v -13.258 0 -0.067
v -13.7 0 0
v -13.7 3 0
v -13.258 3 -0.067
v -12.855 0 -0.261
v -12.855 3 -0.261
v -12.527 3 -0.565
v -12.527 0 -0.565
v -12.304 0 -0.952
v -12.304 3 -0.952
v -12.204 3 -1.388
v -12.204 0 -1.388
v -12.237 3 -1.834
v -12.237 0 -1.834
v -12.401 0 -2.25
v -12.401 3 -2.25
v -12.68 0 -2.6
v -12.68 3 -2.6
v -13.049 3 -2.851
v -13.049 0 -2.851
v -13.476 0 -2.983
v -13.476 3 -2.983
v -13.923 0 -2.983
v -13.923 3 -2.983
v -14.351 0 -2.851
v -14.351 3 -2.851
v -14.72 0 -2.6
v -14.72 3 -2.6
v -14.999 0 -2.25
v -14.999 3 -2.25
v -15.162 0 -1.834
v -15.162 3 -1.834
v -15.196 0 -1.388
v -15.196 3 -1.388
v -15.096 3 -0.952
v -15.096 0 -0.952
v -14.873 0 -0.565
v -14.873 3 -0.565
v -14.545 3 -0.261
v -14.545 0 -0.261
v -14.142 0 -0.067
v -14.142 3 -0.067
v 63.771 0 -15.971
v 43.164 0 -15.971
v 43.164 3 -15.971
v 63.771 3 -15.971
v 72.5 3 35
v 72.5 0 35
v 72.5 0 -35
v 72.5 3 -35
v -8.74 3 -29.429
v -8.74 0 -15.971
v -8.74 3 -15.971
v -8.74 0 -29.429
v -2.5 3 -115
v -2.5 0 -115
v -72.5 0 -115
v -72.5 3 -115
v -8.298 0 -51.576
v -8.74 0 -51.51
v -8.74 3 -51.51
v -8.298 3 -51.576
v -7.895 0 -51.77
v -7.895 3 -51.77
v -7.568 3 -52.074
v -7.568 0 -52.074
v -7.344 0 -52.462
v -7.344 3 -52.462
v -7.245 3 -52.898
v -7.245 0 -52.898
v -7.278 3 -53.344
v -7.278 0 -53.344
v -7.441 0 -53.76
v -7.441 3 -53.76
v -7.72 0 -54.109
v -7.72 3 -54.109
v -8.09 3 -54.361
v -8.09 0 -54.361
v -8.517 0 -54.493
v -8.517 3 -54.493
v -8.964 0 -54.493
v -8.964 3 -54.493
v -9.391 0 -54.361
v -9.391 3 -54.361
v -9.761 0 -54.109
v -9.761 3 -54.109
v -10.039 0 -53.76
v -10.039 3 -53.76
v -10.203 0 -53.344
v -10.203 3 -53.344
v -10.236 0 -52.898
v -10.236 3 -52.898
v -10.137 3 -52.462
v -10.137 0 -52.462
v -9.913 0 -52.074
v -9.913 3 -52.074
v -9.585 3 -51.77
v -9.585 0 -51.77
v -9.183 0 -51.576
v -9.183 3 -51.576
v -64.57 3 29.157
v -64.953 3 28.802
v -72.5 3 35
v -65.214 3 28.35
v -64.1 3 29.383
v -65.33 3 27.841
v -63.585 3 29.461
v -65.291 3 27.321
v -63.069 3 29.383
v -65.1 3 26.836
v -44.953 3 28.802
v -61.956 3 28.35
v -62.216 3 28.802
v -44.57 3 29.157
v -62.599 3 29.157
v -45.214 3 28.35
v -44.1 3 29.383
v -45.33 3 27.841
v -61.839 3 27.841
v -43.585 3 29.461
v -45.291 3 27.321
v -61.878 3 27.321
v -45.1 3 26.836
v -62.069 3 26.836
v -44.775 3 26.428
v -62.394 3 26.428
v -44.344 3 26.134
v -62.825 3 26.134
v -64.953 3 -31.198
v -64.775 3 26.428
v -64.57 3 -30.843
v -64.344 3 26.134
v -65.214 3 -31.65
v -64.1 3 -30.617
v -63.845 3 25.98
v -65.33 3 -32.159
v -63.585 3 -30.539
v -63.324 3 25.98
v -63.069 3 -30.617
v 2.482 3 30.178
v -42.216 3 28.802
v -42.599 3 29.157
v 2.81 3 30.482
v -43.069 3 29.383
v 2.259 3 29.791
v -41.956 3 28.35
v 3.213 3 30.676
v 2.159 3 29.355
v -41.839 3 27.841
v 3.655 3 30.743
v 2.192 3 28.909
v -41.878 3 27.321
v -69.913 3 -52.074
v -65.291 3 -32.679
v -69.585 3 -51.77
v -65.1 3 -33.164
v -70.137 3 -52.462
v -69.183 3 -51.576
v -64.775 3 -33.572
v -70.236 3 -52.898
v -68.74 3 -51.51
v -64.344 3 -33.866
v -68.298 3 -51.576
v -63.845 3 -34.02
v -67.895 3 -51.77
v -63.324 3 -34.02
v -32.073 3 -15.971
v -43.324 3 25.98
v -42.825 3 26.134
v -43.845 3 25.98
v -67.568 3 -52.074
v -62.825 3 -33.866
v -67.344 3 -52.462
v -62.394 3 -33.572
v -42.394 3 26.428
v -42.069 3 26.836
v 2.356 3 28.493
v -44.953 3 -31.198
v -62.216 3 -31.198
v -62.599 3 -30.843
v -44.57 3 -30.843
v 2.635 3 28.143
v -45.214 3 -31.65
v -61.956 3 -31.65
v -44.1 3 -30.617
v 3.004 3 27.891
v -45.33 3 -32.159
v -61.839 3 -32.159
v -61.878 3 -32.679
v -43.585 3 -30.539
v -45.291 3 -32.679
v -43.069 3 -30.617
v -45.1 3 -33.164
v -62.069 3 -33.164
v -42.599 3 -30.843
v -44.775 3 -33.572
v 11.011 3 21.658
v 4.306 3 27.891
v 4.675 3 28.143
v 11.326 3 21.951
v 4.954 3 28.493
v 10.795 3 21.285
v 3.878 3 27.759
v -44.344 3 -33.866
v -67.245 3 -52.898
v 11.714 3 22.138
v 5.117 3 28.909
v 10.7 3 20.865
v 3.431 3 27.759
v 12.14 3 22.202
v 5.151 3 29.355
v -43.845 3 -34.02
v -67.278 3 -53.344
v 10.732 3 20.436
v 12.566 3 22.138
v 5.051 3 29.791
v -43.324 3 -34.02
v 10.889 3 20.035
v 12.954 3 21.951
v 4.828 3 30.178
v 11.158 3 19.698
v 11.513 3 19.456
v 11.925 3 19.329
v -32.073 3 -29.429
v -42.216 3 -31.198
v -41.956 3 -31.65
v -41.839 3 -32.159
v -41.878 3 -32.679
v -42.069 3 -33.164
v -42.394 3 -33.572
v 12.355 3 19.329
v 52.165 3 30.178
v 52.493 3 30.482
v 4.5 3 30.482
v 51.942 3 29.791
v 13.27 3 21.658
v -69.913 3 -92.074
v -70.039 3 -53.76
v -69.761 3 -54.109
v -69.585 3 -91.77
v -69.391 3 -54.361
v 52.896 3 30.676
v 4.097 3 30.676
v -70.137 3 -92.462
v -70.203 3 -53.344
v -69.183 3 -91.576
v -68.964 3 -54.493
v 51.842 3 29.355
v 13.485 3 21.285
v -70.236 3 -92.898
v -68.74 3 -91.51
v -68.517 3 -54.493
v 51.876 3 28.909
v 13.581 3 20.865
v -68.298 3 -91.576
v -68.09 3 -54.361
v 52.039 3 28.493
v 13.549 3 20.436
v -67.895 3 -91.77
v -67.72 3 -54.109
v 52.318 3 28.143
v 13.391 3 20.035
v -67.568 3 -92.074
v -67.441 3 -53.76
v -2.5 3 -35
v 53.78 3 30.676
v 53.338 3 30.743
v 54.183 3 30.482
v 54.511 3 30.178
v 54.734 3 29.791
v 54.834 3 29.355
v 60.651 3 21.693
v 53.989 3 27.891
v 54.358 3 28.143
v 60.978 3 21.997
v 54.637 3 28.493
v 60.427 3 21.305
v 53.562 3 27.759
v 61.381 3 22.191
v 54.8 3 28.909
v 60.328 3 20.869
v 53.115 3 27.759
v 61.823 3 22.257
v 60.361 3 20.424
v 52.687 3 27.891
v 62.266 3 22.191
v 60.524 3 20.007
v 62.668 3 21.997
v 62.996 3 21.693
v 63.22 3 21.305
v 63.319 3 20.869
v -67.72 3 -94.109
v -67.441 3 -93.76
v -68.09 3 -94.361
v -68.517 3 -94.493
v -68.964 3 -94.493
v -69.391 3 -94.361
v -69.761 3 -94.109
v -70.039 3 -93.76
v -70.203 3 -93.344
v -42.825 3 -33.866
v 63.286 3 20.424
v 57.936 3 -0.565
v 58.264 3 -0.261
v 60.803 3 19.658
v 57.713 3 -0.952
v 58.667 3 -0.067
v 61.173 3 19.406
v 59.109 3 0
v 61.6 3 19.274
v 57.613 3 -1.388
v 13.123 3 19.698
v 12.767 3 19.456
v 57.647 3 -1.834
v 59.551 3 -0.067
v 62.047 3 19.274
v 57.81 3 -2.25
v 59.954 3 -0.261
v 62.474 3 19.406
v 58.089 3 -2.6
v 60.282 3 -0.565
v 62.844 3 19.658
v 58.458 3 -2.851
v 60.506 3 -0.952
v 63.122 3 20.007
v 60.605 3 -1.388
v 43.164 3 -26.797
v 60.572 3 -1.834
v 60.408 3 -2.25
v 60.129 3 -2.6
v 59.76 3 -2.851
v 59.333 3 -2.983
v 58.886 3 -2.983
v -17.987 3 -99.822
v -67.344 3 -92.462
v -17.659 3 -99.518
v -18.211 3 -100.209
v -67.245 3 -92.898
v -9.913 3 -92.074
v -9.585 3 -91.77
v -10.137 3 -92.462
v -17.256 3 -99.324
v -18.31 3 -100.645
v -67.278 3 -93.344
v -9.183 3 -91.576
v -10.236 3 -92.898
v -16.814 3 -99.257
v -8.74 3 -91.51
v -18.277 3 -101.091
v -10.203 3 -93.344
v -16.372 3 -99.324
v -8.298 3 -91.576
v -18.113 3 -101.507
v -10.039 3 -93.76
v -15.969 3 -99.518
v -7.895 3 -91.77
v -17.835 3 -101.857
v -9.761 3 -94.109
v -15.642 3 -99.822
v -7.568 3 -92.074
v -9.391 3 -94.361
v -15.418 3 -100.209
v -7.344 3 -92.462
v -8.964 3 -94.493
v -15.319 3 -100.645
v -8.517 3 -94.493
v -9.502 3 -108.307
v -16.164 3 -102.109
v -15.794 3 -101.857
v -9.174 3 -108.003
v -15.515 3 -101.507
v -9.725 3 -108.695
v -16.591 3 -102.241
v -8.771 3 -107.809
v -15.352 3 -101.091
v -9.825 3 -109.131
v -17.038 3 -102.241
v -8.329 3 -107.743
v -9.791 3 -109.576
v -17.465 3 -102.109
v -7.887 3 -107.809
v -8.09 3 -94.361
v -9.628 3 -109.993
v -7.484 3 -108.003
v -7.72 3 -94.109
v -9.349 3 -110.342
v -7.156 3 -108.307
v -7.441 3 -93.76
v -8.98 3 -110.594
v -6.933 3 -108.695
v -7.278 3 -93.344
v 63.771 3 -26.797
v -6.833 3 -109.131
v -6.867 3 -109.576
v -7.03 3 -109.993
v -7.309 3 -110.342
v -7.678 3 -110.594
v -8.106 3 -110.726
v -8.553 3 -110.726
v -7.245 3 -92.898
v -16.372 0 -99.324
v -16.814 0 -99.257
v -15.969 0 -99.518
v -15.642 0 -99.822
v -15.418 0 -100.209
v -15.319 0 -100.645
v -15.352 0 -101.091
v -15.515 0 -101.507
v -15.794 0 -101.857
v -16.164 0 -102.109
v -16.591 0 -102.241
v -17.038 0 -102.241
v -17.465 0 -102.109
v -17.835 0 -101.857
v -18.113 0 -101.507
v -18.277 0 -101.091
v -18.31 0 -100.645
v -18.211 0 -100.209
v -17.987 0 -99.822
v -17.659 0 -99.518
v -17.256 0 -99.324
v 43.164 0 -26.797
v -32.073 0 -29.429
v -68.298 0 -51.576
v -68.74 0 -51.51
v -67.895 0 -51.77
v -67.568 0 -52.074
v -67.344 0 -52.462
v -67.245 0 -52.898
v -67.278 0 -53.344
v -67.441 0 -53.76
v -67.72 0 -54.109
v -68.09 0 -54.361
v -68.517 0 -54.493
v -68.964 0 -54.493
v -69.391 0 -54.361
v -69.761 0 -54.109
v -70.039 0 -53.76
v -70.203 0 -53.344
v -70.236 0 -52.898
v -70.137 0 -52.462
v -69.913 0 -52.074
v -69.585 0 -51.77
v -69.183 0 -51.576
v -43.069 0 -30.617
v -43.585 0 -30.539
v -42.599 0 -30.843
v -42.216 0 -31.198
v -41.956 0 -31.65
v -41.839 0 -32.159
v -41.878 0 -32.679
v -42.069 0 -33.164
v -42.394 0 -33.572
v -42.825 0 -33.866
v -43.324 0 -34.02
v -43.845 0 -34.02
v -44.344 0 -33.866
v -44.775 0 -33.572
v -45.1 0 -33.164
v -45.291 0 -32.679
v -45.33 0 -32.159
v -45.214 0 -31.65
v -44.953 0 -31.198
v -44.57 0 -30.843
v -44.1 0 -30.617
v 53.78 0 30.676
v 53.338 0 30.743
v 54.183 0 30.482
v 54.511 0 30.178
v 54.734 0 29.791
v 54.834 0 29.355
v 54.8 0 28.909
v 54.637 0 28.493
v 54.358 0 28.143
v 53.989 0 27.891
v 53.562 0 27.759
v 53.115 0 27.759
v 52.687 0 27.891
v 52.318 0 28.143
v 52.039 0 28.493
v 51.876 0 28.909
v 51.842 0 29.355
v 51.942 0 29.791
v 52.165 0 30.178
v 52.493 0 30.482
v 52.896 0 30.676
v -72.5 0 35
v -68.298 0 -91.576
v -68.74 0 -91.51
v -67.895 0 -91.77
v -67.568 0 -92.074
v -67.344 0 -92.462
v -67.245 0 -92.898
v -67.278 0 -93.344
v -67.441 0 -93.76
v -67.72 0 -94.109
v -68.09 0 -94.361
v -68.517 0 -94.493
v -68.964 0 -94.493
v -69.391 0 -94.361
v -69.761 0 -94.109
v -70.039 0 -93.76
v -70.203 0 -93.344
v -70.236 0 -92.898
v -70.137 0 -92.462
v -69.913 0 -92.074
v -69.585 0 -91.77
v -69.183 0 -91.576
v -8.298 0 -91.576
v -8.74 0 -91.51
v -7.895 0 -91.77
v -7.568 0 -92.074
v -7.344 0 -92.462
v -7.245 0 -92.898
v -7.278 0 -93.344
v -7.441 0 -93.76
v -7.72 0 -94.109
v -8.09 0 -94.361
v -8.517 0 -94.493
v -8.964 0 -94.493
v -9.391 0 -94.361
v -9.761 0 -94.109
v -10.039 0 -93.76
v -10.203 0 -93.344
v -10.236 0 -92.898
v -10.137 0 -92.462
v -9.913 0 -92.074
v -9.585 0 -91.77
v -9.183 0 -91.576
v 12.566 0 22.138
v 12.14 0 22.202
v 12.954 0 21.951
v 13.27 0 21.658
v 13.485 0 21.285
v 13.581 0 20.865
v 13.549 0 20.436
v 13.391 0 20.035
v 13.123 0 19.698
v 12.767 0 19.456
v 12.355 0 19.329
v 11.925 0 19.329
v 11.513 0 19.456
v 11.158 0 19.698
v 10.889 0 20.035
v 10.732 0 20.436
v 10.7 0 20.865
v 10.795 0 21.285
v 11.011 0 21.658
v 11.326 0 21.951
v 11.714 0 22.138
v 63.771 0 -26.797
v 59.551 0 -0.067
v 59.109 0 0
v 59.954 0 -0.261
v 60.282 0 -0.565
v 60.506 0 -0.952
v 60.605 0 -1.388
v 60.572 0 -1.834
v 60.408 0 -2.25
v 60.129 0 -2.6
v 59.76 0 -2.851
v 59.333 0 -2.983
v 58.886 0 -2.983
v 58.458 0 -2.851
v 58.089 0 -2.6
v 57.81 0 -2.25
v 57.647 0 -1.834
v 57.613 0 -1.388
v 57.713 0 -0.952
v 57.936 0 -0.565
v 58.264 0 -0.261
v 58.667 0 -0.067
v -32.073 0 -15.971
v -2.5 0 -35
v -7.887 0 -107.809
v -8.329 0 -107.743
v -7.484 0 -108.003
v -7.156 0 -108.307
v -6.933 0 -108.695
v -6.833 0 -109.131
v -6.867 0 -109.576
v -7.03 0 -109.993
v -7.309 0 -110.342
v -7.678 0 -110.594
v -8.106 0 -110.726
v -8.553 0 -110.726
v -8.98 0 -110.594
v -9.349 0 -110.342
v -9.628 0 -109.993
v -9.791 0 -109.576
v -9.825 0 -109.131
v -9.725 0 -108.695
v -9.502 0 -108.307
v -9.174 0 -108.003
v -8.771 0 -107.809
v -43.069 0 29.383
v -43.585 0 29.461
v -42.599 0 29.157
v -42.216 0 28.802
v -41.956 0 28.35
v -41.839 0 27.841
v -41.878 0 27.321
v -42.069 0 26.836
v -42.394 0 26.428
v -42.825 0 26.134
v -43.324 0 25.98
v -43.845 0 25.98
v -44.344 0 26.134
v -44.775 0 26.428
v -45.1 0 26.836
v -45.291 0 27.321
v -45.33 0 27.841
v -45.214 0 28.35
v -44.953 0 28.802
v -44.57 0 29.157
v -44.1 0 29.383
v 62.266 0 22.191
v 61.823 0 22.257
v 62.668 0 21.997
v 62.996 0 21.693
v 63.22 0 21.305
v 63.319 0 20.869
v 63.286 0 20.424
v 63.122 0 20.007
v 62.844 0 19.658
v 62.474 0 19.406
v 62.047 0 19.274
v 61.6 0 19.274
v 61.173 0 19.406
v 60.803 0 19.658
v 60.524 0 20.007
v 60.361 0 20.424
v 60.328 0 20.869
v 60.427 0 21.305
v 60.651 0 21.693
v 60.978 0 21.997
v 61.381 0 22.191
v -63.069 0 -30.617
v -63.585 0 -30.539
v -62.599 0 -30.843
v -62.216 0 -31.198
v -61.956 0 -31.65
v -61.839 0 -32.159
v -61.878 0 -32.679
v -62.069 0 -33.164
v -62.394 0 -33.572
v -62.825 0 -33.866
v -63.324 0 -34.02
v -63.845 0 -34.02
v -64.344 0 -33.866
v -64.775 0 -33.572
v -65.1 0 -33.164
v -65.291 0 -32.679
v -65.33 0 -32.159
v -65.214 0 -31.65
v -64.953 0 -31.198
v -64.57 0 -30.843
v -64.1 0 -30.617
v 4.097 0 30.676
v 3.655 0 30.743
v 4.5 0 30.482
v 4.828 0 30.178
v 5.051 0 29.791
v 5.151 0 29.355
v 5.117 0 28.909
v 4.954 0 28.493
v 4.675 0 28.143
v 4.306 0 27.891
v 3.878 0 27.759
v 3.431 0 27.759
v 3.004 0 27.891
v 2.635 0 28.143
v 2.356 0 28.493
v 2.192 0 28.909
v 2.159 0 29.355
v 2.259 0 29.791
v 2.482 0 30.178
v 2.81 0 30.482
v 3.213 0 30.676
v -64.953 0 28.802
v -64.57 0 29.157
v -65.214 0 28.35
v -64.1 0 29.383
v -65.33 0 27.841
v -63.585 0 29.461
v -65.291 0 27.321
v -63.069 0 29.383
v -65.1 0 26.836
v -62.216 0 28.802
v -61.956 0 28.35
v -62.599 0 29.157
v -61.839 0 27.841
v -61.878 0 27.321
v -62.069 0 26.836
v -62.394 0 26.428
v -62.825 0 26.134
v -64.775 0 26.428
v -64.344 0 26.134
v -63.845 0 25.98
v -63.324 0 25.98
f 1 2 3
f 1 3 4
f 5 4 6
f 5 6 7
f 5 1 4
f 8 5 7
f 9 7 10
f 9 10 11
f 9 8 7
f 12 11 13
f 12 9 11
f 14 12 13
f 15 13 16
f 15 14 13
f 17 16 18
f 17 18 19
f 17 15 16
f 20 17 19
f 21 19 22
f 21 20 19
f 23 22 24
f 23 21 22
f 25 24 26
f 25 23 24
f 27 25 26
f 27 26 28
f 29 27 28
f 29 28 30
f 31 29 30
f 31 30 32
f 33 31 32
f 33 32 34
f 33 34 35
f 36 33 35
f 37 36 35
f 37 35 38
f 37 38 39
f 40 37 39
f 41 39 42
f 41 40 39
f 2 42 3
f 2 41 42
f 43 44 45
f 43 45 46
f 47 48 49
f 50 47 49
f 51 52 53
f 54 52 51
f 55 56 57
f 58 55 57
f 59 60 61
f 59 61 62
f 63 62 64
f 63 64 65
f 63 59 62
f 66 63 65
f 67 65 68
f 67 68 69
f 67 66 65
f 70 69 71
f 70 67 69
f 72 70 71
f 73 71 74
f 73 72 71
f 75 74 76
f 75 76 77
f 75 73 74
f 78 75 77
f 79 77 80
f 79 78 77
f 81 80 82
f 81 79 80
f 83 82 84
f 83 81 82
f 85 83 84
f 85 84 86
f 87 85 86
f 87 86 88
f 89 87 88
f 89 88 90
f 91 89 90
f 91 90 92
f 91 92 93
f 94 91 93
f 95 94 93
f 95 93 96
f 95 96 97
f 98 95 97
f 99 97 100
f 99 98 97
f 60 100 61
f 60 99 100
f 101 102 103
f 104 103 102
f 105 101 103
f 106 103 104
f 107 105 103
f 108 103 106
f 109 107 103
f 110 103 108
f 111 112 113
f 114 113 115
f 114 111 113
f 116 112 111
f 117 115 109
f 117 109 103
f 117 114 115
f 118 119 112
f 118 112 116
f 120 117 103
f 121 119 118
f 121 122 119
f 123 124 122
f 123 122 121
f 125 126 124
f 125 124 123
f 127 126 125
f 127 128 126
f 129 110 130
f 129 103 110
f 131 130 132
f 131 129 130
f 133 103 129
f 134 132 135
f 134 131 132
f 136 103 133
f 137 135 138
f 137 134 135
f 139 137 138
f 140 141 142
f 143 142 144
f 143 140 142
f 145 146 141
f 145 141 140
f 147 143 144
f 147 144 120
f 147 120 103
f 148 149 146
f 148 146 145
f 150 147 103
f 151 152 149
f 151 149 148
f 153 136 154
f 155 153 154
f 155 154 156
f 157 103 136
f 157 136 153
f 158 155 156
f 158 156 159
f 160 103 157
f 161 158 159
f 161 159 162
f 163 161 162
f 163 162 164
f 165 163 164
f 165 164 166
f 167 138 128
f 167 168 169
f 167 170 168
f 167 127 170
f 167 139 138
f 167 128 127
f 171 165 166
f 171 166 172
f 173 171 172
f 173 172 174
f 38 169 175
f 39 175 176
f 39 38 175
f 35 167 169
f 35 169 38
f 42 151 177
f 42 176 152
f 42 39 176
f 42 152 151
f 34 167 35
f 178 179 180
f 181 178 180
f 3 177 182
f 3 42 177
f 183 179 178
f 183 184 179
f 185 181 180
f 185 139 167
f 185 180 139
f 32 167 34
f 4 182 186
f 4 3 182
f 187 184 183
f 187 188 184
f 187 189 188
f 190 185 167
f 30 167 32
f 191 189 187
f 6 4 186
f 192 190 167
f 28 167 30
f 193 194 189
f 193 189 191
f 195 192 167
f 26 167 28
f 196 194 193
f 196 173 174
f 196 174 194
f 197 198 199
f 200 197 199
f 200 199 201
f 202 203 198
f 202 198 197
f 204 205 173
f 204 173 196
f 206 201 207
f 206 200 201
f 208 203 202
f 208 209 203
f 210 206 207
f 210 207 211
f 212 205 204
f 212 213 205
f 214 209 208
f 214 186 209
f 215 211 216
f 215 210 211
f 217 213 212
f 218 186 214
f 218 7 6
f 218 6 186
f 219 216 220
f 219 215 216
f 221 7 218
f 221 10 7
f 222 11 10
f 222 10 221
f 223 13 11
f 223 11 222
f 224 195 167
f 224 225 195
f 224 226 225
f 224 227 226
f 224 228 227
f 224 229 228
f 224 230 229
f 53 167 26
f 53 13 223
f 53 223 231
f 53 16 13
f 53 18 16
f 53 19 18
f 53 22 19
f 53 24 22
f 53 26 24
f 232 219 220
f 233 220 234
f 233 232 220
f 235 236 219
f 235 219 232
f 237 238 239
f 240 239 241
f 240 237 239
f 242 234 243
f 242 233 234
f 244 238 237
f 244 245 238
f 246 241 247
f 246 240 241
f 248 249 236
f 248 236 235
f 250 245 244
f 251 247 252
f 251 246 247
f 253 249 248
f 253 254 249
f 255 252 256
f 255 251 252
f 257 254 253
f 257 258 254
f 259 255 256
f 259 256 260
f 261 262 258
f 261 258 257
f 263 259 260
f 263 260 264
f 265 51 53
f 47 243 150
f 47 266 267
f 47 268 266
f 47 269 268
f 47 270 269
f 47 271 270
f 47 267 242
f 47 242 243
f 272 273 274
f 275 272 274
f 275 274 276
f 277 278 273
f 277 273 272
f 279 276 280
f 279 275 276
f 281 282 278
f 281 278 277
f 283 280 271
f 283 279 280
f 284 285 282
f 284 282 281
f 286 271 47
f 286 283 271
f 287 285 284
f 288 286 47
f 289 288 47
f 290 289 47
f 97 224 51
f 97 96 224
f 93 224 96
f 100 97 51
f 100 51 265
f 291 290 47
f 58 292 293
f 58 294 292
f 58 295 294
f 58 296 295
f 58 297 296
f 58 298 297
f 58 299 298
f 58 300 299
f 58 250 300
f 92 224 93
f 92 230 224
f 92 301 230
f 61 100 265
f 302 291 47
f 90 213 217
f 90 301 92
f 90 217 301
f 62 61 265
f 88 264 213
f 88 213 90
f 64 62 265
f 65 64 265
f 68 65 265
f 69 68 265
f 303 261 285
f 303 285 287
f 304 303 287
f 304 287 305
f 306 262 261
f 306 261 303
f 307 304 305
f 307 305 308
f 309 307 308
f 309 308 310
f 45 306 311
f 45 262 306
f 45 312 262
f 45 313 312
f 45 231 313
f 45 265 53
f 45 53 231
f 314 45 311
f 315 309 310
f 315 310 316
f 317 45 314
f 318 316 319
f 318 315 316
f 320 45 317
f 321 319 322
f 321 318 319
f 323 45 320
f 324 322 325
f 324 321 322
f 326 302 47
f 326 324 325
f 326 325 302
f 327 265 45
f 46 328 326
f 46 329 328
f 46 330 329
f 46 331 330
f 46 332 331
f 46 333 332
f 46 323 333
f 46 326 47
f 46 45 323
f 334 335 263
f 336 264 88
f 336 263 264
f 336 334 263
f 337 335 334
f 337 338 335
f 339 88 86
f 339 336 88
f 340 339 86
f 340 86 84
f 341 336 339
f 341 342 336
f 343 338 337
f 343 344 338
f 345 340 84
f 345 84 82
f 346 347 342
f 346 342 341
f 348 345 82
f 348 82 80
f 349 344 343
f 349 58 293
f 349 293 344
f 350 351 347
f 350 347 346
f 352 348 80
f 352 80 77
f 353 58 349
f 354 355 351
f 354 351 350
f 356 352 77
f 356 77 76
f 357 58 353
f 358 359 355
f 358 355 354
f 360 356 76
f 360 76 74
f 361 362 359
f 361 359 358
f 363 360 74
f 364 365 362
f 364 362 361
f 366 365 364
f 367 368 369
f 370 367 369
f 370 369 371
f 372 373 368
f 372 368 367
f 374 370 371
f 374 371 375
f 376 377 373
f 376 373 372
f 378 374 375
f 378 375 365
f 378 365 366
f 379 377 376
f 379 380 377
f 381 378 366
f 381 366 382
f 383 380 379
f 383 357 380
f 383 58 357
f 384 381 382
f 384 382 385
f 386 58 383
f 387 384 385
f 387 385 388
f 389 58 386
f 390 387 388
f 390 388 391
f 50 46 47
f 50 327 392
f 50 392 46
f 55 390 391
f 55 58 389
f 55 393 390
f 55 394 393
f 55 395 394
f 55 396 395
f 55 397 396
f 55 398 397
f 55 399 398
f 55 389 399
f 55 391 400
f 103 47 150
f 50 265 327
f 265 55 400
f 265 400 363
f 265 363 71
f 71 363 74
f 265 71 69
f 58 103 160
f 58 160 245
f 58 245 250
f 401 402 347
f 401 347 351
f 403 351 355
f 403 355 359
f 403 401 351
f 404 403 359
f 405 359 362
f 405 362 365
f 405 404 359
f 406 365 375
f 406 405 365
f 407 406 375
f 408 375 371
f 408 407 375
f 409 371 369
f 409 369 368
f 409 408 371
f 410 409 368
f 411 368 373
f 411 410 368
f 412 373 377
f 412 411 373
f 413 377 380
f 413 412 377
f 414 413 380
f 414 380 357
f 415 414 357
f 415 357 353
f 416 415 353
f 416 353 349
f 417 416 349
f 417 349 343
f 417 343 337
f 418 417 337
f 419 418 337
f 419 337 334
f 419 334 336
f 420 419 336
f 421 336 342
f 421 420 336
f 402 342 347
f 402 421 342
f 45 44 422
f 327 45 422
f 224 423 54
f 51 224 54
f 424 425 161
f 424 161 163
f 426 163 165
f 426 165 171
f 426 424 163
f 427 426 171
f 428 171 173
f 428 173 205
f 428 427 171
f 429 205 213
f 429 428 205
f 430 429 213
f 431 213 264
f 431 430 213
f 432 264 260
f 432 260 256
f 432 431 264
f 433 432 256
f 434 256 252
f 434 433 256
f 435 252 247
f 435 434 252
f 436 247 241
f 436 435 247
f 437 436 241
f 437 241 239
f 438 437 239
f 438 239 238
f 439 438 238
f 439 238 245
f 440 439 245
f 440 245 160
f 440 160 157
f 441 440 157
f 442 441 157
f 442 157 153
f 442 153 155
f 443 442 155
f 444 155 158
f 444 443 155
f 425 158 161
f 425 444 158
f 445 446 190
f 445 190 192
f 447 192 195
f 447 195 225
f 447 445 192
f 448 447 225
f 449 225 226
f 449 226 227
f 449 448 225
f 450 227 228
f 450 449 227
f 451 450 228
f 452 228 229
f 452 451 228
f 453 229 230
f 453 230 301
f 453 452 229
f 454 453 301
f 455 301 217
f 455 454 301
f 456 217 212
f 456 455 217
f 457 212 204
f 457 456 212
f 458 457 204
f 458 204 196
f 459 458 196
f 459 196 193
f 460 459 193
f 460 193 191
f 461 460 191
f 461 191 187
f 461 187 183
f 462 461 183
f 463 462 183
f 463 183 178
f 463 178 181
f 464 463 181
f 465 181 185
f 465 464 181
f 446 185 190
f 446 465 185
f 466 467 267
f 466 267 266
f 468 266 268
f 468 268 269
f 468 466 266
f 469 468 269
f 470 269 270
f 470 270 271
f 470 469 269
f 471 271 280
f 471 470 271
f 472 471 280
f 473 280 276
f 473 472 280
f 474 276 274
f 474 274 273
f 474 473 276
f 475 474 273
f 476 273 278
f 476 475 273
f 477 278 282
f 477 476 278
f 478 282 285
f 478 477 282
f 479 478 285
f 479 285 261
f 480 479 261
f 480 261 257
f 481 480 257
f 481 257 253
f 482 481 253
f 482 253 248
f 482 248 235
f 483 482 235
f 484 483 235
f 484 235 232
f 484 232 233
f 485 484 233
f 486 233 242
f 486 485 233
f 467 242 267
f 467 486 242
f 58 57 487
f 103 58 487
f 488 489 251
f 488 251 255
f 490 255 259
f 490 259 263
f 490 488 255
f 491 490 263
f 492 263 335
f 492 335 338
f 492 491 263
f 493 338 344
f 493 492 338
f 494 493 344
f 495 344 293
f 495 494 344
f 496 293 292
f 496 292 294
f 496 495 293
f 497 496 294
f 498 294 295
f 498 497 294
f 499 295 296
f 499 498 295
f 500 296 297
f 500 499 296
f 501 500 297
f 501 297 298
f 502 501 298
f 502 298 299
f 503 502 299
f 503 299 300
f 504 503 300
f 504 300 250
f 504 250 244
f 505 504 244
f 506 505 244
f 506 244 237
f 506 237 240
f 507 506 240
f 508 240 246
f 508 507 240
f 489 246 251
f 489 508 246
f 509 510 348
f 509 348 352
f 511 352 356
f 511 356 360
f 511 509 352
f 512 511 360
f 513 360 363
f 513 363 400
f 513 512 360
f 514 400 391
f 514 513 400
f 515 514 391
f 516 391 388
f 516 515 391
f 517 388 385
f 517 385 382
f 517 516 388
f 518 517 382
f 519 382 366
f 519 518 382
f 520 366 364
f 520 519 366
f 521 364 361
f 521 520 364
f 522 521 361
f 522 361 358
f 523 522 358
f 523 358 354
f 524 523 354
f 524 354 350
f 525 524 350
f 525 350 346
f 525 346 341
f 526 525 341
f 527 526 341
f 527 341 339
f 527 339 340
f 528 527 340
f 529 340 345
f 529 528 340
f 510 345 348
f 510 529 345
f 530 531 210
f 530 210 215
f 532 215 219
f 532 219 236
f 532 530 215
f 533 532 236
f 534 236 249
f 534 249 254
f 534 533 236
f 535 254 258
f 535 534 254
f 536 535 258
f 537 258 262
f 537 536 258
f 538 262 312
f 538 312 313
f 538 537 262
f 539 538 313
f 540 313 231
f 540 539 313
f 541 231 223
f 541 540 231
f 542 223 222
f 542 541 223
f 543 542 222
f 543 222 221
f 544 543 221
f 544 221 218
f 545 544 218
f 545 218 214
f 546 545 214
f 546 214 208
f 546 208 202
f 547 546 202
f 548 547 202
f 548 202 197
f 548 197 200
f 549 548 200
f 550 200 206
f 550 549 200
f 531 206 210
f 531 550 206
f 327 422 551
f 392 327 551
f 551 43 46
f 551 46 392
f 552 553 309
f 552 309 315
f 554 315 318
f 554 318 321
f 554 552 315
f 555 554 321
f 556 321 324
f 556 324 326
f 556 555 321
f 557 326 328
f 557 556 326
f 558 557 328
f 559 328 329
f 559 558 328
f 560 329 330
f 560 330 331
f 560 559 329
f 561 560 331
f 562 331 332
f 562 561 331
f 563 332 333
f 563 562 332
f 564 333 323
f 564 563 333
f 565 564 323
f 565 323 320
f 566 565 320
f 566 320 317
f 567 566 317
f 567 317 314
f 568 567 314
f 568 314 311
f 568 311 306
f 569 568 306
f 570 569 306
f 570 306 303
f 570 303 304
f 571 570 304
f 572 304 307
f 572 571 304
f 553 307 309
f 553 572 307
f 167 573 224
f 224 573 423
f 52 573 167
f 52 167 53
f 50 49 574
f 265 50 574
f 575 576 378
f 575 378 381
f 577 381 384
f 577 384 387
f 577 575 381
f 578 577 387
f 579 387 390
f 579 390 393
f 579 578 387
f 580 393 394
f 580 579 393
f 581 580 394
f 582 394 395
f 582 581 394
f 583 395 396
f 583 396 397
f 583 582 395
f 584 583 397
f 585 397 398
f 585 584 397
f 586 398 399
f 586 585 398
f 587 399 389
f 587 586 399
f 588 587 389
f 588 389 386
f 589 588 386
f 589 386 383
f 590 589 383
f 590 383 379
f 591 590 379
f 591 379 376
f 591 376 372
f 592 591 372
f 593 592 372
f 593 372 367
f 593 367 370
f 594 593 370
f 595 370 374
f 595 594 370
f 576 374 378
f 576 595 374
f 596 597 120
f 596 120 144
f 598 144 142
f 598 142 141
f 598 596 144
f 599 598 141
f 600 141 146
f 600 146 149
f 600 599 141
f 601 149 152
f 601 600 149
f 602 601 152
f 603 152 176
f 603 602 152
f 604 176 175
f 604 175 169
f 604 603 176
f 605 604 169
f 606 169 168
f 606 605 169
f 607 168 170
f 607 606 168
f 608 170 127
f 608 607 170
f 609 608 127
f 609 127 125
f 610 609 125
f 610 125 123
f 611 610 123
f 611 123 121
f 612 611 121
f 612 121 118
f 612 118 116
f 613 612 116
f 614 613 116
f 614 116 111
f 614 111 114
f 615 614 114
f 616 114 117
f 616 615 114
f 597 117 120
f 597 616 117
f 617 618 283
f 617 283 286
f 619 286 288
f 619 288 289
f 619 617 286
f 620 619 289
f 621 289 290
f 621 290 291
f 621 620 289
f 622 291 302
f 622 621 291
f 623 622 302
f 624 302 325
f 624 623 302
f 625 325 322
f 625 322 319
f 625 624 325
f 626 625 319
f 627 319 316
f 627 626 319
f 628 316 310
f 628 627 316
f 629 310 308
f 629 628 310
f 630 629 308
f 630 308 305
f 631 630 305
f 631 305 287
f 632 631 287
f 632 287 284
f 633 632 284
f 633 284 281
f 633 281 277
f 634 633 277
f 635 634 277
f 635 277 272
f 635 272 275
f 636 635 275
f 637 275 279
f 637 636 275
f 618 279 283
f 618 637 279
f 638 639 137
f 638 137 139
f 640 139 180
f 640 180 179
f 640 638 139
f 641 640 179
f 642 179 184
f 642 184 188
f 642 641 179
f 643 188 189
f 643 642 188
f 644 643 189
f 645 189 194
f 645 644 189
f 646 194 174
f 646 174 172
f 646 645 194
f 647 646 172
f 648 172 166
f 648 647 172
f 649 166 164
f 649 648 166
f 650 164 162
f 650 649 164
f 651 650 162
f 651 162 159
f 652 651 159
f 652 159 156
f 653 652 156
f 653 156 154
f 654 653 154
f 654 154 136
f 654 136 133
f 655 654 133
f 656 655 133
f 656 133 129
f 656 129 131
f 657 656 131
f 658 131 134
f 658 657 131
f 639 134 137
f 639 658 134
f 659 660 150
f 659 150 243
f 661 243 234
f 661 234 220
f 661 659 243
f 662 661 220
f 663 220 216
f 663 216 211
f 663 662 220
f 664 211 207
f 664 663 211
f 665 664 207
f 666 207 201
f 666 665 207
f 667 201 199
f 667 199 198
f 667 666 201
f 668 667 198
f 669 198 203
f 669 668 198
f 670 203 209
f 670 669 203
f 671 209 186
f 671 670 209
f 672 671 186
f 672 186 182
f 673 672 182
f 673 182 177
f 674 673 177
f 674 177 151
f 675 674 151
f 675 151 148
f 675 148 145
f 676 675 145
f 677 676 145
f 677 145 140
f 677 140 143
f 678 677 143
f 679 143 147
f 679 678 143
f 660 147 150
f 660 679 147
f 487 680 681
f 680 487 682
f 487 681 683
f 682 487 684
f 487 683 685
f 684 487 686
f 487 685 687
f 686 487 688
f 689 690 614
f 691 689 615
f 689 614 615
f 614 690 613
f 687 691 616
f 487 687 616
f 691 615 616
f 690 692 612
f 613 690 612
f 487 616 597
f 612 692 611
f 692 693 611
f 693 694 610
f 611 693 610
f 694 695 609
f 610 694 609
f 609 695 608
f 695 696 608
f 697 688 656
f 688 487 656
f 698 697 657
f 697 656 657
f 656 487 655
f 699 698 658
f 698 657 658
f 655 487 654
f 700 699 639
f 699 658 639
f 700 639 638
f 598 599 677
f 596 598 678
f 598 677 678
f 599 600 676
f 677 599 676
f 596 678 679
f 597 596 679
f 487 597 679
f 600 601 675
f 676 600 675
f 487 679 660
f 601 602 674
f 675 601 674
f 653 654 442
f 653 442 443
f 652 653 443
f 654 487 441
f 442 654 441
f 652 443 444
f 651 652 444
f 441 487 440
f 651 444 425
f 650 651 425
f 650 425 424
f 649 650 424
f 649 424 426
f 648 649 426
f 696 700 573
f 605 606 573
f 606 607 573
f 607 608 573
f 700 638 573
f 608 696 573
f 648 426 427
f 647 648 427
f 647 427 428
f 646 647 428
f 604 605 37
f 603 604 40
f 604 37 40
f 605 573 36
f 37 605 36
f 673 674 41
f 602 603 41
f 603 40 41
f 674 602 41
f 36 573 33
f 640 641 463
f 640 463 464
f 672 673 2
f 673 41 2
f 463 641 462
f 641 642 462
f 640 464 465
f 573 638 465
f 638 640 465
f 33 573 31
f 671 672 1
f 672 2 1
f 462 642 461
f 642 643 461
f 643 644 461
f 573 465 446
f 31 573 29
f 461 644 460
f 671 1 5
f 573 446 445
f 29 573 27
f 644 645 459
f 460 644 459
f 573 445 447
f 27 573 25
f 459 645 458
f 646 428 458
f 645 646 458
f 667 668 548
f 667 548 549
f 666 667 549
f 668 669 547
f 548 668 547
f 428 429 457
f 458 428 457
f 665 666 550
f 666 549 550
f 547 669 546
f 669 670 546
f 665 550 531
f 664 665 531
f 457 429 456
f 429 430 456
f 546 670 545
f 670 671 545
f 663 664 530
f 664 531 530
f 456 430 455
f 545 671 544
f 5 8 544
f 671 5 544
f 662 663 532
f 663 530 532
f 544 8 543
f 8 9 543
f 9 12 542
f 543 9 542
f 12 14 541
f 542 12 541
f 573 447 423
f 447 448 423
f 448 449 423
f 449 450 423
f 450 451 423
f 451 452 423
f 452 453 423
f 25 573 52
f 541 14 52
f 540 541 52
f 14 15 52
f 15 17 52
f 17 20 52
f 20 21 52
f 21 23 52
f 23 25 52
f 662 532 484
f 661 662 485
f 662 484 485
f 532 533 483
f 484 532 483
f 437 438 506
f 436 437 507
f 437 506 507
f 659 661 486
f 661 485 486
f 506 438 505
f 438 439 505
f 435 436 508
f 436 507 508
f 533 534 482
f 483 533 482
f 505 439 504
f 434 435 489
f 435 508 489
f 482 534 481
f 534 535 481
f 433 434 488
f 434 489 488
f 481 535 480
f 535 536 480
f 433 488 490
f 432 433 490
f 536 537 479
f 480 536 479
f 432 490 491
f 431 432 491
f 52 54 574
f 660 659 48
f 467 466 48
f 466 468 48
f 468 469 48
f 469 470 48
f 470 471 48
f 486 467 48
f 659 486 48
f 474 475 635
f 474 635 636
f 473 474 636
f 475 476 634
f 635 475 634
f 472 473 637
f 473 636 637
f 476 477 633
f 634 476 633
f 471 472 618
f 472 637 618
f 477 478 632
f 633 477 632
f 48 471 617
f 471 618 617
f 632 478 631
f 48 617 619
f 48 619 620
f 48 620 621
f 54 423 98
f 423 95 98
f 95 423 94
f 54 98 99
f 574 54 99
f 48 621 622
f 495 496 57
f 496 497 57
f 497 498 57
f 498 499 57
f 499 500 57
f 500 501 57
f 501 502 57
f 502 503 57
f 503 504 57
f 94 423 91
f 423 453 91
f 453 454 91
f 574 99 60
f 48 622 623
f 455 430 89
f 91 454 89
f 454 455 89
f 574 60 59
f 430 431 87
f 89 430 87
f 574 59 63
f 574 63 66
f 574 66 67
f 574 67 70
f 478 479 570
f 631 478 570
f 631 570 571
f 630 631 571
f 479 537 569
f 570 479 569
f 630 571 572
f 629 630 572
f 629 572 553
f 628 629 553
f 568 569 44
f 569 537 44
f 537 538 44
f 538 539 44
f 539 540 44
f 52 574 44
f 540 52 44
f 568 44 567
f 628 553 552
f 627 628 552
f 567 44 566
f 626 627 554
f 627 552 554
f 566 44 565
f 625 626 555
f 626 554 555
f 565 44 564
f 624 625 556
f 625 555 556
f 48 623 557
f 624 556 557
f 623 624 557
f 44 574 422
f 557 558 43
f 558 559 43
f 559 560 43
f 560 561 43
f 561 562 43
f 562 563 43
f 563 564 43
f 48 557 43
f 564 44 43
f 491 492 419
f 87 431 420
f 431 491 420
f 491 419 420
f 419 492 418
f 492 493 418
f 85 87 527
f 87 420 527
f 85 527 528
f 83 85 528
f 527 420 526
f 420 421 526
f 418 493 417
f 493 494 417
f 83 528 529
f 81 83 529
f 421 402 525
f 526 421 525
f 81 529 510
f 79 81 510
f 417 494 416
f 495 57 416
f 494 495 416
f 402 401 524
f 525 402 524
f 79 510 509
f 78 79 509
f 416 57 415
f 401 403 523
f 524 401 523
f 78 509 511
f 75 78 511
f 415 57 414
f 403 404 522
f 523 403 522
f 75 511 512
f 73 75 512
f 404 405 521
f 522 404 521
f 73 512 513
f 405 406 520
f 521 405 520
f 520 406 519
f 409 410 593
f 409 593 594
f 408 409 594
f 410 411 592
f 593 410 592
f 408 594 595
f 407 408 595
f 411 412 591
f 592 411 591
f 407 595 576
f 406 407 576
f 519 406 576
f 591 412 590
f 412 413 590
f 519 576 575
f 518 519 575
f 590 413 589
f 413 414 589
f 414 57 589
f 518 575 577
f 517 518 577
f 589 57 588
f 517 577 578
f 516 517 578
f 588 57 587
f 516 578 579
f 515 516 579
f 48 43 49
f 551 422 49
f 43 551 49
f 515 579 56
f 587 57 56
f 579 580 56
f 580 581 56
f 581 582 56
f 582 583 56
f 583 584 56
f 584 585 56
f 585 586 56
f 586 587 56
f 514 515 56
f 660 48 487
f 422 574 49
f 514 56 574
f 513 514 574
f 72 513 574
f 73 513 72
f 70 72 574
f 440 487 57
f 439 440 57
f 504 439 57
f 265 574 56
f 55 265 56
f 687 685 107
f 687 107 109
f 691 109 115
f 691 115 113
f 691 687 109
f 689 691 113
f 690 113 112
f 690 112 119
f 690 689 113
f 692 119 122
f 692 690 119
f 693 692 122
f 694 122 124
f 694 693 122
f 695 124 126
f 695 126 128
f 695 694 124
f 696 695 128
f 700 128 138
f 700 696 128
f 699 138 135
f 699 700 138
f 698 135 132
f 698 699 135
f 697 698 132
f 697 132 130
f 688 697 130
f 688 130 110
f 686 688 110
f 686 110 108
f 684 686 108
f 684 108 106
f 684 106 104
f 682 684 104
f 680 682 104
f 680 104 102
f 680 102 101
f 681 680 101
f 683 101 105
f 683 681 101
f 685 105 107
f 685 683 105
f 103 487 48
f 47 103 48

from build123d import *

# Parameters (mm, degrees)
SKETCH1_R           = 1.5
SKETCH1_R_2         = 1.44463942
SKETCH1_R_3         = 1.75
SKETCH1_W           = 23.332723566
SKETCH1_H           = 13.458477976
SKETCH1_W_2         = 20.606585233
SKETCH1_H_2         = 10.826007204
BOSS_EXTRUDE1_DEPTH = 3


with BuildPart() as part:
    # Sketch1 → Boss-Extrude1 (new body)
    with BuildSketch(Plane(origin=(0, 0, 0), x_dir=(1, 0, 0), z_dir=(0, 1, 0))):
        Polygon((-72.5, -35), (72.5, -35), (72.5, 35), (-2.5, 35), (-2.5, 115), (-72.5, 115), (-72.5, 35), align=None)
        with Locations(Location((3.654827994, -29.242640687, 0), (0, 0, 270))):
            Circle(SKETCH1_R, mode=Mode.SUBTRACT)
        with Locations(Location((12.140109368, -20.757359313, 0), (0, 0, 270))):
            Circle(SKETCH1_R_2, mode=Mode.SUBTRACT)
        with Locations(Location((53.338095075, -29.242640687, 0), (0, 0, 270))):
            Circle(SKETCH1_R, mode=Mode.SUBTRACT)
        with Locations(Location((61.823376449, -20.757359313, 0), (0, 0, 270))):
            Circle(SKETCH1_R, mode=Mode.SUBTRACT)
        with Locations(Location((-16.814355015, 100.757359313, 0), (0, 0, 270))):
            Circle(SKETCH1_R, mode=Mode.SUBTRACT)
        with Locations(Location((-8.329073641, 109.242640687, 0), (0, 0, 270))):
            Circle(SKETCH1_R, mode=Mode.SUBTRACT)
        with Locations(Location((-13.69982199, 1.5, 0), (0, 0, 270))):
            Circle(SKETCH1_R, mode=Mode.SUBTRACT)
        with Locations(Location((59.109237961, 1.5, 0), (0, 0, 270))):
            Circle(SKETCH1_R, mode=Mode.SUBTRACT)
        with Locations(Location((-63.584566194, -27.710636817, 0), (0, 0, 270))):
            Circle(SKETCH1_R_3, mode=Mode.SUBTRACT)
        with Locations(Location((-43.584566194, -27.710636817, 0), (0, 0, 270))):
            Circle(SKETCH1_R_3, mode=Mode.SUBTRACT)
        with Locations(Location((-43.584566194, 32.289363183, 0), (0, 0, 270))):
            Circle(SKETCH1_R_3, mode=Mode.SUBTRACT)
        with Locations(Location((-63.584566194, 32.289363183, 0), (0, 0, 270))):
            Circle(SKETCH1_R_3, mode=Mode.SUBTRACT)
        with Locations(Location((-68.740395312, 53.009730632, 0), (0, 0, 270))):
            Circle(SKETCH1_R, mode=Mode.SUBTRACT)
        with Locations(Location((-68.740395312, 93.009730632, 0), (0, 0, 270))):
            Circle(SKETCH1_R, mode=Mode.SUBTRACT)
        with Locations(Location((-8.740395312, 93.009730632, 0), (0, 0, 270))):
            Circle(SKETCH1_R, mode=Mode.SUBTRACT)
        with Locations(Location((-8.740395312, 53.009730632, 0), (0, 0, 270))):
            Circle(SKETCH1_R, mode=Mode.SUBTRACT)
        with Locations((-20.406757095, 22.7)):
            Rectangle(SKETCH1_W, SKETCH1_H, mode=Mode.SUBTRACT)
        with Locations((53.46751152, 21.383764614)):
            Rectangle(SKETCH1_W_2, SKETCH1_H_2, mode=Mode.SUBTRACT)
    extrude(amount=BOSS_EXTRUDE1_DEPTH)


solid = part.part
